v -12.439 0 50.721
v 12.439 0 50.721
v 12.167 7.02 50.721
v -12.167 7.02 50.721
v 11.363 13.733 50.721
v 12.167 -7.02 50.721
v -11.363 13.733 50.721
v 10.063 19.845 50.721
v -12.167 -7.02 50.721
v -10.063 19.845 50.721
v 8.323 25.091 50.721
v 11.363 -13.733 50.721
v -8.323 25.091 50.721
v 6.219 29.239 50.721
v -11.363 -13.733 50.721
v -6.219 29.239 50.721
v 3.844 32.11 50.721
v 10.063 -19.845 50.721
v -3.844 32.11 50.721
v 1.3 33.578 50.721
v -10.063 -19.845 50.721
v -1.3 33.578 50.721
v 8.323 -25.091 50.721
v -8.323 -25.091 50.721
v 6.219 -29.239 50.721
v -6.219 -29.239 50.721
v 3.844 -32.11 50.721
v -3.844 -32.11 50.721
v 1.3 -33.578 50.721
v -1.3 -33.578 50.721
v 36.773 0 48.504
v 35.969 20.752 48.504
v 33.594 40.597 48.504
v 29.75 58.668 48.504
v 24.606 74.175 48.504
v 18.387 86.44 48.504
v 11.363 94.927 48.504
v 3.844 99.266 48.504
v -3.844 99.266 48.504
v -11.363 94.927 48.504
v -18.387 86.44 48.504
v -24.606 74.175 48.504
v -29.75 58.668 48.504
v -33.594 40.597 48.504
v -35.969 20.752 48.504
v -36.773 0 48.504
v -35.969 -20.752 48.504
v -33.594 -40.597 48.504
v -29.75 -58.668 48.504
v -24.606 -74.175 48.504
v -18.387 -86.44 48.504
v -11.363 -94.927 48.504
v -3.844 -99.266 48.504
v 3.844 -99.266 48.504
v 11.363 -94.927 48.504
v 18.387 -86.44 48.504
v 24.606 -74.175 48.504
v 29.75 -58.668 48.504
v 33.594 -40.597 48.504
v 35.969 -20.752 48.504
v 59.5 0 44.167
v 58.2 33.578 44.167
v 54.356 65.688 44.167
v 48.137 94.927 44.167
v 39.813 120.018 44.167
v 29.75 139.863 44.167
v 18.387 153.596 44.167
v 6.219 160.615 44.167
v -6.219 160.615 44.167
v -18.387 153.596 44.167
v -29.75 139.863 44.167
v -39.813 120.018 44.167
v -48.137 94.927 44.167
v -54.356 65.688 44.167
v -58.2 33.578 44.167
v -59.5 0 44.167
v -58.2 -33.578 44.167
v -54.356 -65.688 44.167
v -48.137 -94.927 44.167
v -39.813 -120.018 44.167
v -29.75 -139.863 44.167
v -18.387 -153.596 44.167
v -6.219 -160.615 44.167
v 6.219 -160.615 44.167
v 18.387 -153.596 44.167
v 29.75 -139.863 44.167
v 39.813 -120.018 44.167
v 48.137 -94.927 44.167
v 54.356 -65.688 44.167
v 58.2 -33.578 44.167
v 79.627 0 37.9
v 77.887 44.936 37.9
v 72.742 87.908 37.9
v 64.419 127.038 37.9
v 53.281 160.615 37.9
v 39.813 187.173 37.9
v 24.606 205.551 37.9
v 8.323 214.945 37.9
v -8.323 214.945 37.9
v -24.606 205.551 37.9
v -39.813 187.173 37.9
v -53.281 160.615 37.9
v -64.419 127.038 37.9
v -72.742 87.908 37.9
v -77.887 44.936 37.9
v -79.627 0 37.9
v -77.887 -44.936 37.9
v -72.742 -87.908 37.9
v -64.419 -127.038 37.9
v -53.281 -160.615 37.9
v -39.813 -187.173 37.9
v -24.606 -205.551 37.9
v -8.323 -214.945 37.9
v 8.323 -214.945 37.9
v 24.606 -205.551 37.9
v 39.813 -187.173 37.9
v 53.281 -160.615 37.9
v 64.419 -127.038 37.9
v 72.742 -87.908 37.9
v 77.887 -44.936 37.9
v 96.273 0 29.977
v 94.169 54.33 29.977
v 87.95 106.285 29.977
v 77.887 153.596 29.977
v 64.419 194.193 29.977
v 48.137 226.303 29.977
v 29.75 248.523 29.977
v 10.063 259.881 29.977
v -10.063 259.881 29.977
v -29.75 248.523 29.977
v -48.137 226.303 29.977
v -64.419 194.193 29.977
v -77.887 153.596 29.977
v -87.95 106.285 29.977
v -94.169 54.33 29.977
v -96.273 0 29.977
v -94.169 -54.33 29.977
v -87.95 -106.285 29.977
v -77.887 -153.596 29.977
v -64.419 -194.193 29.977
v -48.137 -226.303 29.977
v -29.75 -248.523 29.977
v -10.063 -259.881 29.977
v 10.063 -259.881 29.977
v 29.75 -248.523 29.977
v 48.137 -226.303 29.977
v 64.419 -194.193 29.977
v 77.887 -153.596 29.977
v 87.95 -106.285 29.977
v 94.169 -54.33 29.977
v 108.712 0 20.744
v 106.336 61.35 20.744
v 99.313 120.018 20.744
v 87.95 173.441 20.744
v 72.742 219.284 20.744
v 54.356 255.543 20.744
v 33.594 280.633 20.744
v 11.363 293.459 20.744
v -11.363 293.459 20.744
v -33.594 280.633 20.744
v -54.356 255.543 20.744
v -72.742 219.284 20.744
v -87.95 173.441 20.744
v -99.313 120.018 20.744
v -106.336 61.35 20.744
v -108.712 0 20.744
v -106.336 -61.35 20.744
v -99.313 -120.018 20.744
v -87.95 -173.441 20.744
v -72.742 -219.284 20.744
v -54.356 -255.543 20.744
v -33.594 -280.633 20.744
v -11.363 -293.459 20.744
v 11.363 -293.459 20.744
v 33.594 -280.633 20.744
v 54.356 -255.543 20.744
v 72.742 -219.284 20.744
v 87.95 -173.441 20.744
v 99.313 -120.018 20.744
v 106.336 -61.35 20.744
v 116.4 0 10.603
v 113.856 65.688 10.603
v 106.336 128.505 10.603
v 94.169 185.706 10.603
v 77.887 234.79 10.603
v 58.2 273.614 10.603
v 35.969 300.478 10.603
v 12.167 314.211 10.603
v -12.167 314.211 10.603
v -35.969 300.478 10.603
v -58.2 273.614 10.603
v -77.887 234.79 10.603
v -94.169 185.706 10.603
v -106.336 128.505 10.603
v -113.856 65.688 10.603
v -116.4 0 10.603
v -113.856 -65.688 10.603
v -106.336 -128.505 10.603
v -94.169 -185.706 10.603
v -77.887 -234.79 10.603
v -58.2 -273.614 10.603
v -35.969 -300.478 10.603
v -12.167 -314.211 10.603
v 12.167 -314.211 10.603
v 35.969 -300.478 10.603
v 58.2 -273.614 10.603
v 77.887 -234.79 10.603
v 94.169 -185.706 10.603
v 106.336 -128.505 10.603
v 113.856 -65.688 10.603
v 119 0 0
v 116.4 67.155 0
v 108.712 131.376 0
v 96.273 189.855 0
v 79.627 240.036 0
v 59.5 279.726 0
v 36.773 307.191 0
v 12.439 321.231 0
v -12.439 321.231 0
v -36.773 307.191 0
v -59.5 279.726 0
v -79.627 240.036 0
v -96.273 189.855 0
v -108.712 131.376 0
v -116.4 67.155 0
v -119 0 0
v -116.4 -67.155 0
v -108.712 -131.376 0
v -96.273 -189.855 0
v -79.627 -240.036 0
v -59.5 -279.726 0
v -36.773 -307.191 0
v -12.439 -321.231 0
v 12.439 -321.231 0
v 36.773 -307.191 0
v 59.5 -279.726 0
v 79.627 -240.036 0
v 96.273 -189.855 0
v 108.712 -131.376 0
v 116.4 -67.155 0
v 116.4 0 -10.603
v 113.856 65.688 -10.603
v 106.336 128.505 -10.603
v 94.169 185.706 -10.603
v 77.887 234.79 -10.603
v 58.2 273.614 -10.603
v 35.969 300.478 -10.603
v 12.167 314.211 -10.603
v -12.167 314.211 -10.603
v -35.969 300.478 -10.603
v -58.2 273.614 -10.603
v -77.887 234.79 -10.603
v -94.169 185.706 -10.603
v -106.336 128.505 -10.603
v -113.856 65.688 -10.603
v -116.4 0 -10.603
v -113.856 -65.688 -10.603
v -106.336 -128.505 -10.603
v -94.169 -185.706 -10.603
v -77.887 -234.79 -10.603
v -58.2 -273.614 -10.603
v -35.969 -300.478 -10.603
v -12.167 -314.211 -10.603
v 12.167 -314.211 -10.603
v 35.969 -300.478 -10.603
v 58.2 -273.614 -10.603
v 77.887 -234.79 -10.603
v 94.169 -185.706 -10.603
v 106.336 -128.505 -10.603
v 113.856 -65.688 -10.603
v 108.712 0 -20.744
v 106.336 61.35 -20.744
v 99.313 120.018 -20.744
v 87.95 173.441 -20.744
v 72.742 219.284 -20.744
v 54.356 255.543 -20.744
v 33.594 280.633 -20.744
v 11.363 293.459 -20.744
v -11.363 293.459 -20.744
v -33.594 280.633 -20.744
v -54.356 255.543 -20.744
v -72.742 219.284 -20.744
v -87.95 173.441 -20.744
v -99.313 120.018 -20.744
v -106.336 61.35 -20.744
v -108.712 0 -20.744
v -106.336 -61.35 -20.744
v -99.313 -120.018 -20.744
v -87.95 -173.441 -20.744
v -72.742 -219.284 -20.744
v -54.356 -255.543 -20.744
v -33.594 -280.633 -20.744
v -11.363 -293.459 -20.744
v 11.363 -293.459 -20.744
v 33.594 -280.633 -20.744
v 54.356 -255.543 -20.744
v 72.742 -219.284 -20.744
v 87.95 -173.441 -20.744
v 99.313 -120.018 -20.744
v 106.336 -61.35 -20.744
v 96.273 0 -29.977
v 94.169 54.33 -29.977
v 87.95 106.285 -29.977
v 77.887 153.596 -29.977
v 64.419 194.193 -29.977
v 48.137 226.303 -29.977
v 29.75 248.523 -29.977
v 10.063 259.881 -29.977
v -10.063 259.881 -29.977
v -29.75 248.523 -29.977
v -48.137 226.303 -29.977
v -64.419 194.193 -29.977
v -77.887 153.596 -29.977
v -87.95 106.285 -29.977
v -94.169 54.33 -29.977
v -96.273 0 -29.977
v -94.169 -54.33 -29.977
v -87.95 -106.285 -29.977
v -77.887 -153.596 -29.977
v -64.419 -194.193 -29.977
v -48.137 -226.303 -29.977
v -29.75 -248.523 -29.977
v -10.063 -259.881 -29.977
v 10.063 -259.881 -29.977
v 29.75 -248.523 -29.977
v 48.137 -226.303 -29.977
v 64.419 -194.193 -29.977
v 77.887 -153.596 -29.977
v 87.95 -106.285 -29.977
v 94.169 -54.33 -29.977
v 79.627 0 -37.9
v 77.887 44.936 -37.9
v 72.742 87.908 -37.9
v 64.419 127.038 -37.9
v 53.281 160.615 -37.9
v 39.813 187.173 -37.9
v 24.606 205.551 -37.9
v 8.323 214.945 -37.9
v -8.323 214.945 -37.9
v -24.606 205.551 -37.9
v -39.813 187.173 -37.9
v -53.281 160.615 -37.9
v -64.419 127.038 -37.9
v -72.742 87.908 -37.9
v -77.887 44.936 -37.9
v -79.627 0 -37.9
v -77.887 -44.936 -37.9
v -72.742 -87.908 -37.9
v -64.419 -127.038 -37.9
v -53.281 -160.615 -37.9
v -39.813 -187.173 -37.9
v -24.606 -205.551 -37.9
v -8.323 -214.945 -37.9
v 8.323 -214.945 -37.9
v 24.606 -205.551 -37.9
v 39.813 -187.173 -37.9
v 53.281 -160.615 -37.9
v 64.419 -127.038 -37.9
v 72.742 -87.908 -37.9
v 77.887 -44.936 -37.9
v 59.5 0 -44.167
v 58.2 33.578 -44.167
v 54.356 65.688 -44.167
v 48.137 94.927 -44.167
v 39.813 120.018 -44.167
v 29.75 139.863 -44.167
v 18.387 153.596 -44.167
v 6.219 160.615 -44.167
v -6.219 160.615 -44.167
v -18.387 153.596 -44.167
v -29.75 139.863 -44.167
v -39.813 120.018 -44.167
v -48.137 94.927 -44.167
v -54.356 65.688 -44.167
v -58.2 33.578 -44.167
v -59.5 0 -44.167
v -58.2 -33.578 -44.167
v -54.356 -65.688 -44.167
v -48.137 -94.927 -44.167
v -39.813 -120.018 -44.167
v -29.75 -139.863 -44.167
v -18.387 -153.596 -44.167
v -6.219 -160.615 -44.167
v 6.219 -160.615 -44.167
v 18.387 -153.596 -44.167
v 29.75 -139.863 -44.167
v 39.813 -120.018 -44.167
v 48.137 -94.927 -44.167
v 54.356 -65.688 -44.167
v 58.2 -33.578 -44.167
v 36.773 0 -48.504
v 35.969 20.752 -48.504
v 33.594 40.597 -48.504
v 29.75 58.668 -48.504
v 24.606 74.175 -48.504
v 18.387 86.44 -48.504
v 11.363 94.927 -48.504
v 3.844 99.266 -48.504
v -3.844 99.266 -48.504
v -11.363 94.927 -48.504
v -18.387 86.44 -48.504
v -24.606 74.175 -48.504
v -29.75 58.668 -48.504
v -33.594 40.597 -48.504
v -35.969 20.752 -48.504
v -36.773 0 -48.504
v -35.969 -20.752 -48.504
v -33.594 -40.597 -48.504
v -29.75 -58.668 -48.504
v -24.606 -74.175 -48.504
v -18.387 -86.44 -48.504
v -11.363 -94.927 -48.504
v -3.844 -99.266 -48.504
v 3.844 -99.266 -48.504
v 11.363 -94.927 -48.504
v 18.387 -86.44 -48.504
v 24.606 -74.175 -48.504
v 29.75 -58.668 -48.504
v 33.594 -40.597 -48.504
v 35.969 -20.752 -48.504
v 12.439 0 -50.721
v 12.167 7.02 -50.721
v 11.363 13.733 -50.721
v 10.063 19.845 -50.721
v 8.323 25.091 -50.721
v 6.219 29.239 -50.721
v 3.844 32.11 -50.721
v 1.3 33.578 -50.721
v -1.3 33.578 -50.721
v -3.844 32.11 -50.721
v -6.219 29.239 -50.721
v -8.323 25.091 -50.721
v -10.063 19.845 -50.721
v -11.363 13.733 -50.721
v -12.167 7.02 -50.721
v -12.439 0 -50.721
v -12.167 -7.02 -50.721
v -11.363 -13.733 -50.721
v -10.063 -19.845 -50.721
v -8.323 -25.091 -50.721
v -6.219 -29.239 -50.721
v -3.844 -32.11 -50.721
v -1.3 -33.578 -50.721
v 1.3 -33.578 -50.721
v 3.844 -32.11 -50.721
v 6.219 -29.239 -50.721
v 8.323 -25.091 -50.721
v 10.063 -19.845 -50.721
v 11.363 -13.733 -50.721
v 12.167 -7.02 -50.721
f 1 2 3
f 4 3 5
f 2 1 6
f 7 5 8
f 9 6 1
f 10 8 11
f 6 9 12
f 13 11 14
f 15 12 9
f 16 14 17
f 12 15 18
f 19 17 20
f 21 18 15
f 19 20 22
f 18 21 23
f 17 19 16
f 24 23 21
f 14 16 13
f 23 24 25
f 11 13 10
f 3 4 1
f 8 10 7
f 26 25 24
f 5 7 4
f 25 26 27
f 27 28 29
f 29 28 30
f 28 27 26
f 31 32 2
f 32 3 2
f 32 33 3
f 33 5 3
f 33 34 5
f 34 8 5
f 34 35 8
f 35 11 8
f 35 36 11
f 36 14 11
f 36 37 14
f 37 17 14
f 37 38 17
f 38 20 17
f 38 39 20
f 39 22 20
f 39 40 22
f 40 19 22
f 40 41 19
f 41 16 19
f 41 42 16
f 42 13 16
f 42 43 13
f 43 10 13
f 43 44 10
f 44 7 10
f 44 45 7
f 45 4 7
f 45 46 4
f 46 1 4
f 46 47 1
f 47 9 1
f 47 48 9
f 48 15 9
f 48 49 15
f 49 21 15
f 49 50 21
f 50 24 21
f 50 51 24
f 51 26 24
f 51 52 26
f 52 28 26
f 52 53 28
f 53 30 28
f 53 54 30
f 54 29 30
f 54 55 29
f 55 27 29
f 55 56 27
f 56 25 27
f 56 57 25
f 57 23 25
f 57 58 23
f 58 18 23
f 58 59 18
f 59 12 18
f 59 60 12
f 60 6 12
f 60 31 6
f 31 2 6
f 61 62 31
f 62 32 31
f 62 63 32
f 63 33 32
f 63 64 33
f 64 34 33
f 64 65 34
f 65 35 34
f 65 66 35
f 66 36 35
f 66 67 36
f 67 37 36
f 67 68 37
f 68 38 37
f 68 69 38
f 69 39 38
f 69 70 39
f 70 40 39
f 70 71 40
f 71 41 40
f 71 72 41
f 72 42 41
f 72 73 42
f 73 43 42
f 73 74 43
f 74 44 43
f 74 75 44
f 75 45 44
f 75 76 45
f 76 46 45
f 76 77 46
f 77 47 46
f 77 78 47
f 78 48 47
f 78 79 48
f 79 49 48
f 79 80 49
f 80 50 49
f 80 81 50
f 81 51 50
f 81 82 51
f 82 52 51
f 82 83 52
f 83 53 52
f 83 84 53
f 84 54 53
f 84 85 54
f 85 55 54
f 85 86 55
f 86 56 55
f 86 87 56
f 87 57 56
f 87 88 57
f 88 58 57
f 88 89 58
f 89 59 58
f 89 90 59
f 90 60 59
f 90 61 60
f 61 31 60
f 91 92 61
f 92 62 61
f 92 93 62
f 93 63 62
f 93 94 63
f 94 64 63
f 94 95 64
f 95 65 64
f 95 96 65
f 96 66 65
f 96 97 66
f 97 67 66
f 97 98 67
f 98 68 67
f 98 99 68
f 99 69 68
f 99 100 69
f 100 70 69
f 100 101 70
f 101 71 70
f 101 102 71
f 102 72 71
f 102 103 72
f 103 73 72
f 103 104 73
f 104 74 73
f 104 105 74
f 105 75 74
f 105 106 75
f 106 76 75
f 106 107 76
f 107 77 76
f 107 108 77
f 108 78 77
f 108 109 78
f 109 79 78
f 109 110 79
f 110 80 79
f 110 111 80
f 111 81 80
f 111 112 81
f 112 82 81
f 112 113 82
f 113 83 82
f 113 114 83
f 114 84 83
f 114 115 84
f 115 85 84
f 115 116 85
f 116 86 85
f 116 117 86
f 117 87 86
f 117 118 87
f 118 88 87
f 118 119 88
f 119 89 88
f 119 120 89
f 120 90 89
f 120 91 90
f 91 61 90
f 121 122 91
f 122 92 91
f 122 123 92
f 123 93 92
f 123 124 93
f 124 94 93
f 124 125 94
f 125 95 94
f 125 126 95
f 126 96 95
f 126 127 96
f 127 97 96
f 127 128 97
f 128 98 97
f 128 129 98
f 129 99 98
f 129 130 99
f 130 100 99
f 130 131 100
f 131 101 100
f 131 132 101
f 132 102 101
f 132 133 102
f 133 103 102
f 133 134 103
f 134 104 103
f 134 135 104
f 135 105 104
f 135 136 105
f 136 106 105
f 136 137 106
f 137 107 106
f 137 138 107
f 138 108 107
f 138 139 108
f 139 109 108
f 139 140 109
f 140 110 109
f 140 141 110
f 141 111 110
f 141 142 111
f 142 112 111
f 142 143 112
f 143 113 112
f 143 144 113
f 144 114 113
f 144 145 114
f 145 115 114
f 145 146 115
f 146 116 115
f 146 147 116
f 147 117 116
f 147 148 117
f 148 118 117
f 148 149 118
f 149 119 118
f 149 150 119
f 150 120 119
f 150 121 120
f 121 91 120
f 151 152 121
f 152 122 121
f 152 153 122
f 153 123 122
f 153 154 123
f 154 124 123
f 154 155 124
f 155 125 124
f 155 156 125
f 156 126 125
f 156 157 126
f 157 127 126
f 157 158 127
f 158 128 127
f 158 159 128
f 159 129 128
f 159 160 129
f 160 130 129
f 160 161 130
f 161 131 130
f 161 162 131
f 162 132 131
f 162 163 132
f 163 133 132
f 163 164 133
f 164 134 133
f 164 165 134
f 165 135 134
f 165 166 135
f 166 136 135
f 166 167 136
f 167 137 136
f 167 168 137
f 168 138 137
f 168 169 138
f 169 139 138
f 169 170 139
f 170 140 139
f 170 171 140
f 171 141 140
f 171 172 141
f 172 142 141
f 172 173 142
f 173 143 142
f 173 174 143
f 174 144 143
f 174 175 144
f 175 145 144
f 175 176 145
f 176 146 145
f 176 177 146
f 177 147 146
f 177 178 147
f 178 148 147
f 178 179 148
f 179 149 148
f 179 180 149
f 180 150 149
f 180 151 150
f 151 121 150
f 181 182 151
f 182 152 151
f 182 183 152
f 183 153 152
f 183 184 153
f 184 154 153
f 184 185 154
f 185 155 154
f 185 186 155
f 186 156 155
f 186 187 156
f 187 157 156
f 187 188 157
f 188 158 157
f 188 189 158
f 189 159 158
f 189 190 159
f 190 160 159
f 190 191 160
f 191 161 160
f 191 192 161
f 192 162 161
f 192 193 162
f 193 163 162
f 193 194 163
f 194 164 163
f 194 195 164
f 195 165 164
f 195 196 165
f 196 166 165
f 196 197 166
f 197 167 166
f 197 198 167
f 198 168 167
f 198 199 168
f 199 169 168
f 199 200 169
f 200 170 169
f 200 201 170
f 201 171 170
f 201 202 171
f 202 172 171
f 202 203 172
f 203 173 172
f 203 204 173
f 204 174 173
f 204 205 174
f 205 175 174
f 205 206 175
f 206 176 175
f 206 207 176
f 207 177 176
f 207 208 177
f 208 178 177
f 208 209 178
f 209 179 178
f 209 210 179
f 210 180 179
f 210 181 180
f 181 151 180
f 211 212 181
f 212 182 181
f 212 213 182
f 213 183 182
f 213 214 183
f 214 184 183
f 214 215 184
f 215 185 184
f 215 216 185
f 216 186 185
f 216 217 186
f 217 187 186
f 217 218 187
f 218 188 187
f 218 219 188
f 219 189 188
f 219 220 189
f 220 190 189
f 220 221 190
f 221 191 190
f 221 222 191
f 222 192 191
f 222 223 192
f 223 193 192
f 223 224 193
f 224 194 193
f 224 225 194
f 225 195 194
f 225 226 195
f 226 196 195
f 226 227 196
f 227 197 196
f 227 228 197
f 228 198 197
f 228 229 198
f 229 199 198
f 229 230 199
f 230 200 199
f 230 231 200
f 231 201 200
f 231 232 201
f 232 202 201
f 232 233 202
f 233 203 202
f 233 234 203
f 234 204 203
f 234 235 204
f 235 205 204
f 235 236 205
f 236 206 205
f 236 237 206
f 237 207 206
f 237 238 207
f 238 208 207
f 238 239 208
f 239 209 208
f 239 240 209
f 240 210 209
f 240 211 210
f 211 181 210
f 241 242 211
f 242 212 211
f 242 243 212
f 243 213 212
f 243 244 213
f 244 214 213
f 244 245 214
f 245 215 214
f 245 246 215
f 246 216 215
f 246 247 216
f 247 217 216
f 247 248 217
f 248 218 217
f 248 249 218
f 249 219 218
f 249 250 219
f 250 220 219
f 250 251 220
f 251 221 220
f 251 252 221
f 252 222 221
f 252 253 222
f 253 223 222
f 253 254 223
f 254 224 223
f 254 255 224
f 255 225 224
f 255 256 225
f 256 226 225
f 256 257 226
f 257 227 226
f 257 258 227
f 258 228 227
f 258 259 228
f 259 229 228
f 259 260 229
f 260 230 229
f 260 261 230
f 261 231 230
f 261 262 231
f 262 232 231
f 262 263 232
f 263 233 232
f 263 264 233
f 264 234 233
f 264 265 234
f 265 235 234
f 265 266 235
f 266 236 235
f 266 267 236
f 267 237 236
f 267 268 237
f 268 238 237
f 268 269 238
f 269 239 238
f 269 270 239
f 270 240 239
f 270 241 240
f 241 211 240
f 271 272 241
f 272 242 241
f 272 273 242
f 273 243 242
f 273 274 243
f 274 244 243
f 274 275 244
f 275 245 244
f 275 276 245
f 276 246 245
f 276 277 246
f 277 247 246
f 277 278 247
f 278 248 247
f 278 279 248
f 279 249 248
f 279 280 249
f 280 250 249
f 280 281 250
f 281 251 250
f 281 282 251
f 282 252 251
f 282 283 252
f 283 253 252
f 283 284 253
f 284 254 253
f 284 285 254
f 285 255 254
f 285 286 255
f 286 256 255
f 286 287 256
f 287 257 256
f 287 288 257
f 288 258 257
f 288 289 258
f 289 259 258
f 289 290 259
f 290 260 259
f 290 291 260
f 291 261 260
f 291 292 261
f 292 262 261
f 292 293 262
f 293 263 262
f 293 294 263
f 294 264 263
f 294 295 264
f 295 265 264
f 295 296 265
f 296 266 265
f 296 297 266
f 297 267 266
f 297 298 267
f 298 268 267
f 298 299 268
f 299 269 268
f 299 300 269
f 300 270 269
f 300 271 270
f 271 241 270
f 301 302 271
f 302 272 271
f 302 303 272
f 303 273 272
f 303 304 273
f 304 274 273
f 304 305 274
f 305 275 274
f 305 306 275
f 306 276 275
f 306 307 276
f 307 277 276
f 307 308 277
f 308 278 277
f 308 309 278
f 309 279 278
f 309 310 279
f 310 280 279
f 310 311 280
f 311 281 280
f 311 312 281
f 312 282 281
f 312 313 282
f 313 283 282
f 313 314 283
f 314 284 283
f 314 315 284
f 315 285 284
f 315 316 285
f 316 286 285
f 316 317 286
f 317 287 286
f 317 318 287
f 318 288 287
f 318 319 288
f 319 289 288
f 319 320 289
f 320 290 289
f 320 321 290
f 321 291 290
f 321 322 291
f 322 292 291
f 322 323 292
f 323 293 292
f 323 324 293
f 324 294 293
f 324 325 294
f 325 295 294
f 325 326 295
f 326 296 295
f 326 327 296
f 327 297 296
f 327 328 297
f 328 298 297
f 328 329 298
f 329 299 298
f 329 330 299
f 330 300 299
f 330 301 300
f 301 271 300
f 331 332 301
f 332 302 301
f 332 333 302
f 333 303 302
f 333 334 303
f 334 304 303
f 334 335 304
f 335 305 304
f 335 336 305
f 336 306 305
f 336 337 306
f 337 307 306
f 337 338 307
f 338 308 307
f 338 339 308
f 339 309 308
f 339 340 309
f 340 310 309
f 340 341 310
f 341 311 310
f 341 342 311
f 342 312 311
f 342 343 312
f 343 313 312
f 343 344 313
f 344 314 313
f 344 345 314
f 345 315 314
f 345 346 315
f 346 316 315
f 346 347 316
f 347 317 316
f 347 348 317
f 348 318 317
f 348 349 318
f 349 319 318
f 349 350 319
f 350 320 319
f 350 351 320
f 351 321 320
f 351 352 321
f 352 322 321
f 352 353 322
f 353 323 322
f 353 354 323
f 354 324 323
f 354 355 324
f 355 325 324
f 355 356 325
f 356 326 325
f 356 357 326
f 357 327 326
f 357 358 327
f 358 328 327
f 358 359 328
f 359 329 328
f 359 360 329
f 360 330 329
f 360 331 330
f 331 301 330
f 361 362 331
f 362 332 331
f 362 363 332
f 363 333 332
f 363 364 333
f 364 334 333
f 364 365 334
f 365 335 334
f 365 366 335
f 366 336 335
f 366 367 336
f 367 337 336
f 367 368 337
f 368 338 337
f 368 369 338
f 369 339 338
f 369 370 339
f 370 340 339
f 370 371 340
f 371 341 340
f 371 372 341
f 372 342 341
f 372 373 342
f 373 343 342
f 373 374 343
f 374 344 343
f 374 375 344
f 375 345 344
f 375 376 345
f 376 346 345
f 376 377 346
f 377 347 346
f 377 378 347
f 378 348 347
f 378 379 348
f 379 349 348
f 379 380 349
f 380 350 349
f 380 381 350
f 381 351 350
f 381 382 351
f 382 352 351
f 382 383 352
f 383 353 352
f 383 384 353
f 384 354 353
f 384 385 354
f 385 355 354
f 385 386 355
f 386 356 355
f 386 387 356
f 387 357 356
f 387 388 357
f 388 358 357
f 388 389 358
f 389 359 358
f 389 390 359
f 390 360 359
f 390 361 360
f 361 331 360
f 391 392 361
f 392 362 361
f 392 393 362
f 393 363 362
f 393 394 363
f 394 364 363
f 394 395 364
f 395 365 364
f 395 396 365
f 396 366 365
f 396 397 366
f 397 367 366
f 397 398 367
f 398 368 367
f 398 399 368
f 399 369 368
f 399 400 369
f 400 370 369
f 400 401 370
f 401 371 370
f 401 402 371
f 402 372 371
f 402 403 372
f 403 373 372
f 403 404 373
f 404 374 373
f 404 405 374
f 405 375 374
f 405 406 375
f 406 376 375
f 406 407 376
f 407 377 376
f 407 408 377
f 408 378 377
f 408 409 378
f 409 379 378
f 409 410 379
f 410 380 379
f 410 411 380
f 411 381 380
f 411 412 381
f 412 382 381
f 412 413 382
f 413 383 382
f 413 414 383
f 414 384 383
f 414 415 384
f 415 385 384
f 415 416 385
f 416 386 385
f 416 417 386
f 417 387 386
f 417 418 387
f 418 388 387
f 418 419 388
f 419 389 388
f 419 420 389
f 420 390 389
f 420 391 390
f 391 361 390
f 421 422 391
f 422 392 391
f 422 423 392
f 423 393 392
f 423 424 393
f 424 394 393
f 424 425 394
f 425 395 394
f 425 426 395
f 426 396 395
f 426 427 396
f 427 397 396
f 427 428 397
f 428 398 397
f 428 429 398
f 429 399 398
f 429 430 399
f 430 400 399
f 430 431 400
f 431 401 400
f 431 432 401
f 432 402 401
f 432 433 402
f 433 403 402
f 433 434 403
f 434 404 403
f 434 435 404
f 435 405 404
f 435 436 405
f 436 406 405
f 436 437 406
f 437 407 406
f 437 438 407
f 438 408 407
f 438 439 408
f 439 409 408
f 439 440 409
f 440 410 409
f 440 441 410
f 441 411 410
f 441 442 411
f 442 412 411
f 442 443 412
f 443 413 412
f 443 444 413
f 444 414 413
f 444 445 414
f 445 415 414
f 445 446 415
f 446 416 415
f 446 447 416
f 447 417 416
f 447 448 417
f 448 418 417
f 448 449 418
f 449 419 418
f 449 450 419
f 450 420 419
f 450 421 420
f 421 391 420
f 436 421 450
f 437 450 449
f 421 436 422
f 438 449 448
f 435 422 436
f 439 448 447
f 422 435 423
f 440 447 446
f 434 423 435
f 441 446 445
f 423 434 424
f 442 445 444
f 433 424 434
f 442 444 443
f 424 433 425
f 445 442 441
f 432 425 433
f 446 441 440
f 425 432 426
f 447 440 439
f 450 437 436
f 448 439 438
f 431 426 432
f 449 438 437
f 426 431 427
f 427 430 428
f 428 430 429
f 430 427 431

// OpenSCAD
// Generated by SolidPython 1.0.1 on 2020-07-29 00:46:48


scale(v = [7, 19, 3]) {
	sphere(r = 17);
}
/***********************************************
*********      SolidPython code:      **********
************************************************
 
# import packages: SolidPython
from solid import *
from solid.utils import *
from itertools import chain, combinations, permutations


class Resize:

    def __init__(self, scad_file):
        self.scad_file = scad_file
        #self.scad_file = import_scad(scad_file)
        # cone/cylinder param:
        self.r1 = 0
        self.r2 = 0
        self.h = 0
        # rectangular prism param:
        self.w = 0
        self.l = 0
        # ellipse param:
        self.r = 0

    # import OpenScad code (file name corresponds to shape)


    # classify shape + parameters
    def assign(self, param1, param2, param3):
        if self.scad_file == 'cone.scad':
            self.r1 = param1
            self.r2 = param2
            self.h = param3
        elif self.scad_file == 'cylinder.scad':
            self.r1 = param1
            self.r2 = param2
            self.h = param3
        elif self.scad_file == 'rectangularPrism.scad':
            self.h = param1
            self.l = param2
            self.w = param3
        else:
            self.r = param1
            self.h = param2

    # resize parameters
    def iterate(self):
        x = range(3, 20, 2)
        i = 1
        if self.scad_file == 'cone.scad':
            tempList = list(permutations(x, 2))
            for temp in tempList:
                param1 = temp[0]
                param2 = temp[1]
                filepath = 'produced_scad_files/' + 'cone' + str(param1) + '_' + str(param2) + '_' + '.scad'
                scad_render_to_file(cylinder(h=param1, r1=param2, r2=0), filepath)

        elif self.scad_file == 'cylinder.scad':
            tempList = list(permutations(x, 3))
            for temp in tempList:
                param1 = temp[0]
                param2 = temp[1]
                filepath = 'produced_scad_files/' + 'cylinder' + str(param1) + '_' + str(param2) + '_' + '.scad'
                scad_render_to_file(cylinder(h=param1, r1=param2, r2=param2), filepath)

        elif self.scad_file == 'rectangularPrism.scad':
            tempList = list(permutations(x, 3))
            for temp in tempList:
                param1 = temp[0]
                param2 = temp[1]
                param3 = temp[2]
                filepath = 'produced_scad_files/' + 'rectangularPrism' + str(param1) + '_' + str(param2) + '_' + str(
                    param3) + '.scad'
                scad_render_to_file(cube(size=(param1, param2, param3)), filepath)

        elif self.scad_file == 'ellipse.scad':
            tempList = list(permutations(x, 4))
            for temp in tempList:
                param1 = temp[0]
                param2 = temp[1]
                param3 = temp[2]
                param4 = temp[3]
                filepath = 'produced_scad_files/' + 'ellipse' + str(param1) + '_' + str(param2) + '_' + str(param3) + '_' + str(param4) + '.scad'
                scad_render_to_file(scale([param1, param2, param3])(sphere(r=param4)), filepath)

    def render_to_scadfile(self):
        scad_render_to_file(scad, 'example.scad') 
 
************************************************/
